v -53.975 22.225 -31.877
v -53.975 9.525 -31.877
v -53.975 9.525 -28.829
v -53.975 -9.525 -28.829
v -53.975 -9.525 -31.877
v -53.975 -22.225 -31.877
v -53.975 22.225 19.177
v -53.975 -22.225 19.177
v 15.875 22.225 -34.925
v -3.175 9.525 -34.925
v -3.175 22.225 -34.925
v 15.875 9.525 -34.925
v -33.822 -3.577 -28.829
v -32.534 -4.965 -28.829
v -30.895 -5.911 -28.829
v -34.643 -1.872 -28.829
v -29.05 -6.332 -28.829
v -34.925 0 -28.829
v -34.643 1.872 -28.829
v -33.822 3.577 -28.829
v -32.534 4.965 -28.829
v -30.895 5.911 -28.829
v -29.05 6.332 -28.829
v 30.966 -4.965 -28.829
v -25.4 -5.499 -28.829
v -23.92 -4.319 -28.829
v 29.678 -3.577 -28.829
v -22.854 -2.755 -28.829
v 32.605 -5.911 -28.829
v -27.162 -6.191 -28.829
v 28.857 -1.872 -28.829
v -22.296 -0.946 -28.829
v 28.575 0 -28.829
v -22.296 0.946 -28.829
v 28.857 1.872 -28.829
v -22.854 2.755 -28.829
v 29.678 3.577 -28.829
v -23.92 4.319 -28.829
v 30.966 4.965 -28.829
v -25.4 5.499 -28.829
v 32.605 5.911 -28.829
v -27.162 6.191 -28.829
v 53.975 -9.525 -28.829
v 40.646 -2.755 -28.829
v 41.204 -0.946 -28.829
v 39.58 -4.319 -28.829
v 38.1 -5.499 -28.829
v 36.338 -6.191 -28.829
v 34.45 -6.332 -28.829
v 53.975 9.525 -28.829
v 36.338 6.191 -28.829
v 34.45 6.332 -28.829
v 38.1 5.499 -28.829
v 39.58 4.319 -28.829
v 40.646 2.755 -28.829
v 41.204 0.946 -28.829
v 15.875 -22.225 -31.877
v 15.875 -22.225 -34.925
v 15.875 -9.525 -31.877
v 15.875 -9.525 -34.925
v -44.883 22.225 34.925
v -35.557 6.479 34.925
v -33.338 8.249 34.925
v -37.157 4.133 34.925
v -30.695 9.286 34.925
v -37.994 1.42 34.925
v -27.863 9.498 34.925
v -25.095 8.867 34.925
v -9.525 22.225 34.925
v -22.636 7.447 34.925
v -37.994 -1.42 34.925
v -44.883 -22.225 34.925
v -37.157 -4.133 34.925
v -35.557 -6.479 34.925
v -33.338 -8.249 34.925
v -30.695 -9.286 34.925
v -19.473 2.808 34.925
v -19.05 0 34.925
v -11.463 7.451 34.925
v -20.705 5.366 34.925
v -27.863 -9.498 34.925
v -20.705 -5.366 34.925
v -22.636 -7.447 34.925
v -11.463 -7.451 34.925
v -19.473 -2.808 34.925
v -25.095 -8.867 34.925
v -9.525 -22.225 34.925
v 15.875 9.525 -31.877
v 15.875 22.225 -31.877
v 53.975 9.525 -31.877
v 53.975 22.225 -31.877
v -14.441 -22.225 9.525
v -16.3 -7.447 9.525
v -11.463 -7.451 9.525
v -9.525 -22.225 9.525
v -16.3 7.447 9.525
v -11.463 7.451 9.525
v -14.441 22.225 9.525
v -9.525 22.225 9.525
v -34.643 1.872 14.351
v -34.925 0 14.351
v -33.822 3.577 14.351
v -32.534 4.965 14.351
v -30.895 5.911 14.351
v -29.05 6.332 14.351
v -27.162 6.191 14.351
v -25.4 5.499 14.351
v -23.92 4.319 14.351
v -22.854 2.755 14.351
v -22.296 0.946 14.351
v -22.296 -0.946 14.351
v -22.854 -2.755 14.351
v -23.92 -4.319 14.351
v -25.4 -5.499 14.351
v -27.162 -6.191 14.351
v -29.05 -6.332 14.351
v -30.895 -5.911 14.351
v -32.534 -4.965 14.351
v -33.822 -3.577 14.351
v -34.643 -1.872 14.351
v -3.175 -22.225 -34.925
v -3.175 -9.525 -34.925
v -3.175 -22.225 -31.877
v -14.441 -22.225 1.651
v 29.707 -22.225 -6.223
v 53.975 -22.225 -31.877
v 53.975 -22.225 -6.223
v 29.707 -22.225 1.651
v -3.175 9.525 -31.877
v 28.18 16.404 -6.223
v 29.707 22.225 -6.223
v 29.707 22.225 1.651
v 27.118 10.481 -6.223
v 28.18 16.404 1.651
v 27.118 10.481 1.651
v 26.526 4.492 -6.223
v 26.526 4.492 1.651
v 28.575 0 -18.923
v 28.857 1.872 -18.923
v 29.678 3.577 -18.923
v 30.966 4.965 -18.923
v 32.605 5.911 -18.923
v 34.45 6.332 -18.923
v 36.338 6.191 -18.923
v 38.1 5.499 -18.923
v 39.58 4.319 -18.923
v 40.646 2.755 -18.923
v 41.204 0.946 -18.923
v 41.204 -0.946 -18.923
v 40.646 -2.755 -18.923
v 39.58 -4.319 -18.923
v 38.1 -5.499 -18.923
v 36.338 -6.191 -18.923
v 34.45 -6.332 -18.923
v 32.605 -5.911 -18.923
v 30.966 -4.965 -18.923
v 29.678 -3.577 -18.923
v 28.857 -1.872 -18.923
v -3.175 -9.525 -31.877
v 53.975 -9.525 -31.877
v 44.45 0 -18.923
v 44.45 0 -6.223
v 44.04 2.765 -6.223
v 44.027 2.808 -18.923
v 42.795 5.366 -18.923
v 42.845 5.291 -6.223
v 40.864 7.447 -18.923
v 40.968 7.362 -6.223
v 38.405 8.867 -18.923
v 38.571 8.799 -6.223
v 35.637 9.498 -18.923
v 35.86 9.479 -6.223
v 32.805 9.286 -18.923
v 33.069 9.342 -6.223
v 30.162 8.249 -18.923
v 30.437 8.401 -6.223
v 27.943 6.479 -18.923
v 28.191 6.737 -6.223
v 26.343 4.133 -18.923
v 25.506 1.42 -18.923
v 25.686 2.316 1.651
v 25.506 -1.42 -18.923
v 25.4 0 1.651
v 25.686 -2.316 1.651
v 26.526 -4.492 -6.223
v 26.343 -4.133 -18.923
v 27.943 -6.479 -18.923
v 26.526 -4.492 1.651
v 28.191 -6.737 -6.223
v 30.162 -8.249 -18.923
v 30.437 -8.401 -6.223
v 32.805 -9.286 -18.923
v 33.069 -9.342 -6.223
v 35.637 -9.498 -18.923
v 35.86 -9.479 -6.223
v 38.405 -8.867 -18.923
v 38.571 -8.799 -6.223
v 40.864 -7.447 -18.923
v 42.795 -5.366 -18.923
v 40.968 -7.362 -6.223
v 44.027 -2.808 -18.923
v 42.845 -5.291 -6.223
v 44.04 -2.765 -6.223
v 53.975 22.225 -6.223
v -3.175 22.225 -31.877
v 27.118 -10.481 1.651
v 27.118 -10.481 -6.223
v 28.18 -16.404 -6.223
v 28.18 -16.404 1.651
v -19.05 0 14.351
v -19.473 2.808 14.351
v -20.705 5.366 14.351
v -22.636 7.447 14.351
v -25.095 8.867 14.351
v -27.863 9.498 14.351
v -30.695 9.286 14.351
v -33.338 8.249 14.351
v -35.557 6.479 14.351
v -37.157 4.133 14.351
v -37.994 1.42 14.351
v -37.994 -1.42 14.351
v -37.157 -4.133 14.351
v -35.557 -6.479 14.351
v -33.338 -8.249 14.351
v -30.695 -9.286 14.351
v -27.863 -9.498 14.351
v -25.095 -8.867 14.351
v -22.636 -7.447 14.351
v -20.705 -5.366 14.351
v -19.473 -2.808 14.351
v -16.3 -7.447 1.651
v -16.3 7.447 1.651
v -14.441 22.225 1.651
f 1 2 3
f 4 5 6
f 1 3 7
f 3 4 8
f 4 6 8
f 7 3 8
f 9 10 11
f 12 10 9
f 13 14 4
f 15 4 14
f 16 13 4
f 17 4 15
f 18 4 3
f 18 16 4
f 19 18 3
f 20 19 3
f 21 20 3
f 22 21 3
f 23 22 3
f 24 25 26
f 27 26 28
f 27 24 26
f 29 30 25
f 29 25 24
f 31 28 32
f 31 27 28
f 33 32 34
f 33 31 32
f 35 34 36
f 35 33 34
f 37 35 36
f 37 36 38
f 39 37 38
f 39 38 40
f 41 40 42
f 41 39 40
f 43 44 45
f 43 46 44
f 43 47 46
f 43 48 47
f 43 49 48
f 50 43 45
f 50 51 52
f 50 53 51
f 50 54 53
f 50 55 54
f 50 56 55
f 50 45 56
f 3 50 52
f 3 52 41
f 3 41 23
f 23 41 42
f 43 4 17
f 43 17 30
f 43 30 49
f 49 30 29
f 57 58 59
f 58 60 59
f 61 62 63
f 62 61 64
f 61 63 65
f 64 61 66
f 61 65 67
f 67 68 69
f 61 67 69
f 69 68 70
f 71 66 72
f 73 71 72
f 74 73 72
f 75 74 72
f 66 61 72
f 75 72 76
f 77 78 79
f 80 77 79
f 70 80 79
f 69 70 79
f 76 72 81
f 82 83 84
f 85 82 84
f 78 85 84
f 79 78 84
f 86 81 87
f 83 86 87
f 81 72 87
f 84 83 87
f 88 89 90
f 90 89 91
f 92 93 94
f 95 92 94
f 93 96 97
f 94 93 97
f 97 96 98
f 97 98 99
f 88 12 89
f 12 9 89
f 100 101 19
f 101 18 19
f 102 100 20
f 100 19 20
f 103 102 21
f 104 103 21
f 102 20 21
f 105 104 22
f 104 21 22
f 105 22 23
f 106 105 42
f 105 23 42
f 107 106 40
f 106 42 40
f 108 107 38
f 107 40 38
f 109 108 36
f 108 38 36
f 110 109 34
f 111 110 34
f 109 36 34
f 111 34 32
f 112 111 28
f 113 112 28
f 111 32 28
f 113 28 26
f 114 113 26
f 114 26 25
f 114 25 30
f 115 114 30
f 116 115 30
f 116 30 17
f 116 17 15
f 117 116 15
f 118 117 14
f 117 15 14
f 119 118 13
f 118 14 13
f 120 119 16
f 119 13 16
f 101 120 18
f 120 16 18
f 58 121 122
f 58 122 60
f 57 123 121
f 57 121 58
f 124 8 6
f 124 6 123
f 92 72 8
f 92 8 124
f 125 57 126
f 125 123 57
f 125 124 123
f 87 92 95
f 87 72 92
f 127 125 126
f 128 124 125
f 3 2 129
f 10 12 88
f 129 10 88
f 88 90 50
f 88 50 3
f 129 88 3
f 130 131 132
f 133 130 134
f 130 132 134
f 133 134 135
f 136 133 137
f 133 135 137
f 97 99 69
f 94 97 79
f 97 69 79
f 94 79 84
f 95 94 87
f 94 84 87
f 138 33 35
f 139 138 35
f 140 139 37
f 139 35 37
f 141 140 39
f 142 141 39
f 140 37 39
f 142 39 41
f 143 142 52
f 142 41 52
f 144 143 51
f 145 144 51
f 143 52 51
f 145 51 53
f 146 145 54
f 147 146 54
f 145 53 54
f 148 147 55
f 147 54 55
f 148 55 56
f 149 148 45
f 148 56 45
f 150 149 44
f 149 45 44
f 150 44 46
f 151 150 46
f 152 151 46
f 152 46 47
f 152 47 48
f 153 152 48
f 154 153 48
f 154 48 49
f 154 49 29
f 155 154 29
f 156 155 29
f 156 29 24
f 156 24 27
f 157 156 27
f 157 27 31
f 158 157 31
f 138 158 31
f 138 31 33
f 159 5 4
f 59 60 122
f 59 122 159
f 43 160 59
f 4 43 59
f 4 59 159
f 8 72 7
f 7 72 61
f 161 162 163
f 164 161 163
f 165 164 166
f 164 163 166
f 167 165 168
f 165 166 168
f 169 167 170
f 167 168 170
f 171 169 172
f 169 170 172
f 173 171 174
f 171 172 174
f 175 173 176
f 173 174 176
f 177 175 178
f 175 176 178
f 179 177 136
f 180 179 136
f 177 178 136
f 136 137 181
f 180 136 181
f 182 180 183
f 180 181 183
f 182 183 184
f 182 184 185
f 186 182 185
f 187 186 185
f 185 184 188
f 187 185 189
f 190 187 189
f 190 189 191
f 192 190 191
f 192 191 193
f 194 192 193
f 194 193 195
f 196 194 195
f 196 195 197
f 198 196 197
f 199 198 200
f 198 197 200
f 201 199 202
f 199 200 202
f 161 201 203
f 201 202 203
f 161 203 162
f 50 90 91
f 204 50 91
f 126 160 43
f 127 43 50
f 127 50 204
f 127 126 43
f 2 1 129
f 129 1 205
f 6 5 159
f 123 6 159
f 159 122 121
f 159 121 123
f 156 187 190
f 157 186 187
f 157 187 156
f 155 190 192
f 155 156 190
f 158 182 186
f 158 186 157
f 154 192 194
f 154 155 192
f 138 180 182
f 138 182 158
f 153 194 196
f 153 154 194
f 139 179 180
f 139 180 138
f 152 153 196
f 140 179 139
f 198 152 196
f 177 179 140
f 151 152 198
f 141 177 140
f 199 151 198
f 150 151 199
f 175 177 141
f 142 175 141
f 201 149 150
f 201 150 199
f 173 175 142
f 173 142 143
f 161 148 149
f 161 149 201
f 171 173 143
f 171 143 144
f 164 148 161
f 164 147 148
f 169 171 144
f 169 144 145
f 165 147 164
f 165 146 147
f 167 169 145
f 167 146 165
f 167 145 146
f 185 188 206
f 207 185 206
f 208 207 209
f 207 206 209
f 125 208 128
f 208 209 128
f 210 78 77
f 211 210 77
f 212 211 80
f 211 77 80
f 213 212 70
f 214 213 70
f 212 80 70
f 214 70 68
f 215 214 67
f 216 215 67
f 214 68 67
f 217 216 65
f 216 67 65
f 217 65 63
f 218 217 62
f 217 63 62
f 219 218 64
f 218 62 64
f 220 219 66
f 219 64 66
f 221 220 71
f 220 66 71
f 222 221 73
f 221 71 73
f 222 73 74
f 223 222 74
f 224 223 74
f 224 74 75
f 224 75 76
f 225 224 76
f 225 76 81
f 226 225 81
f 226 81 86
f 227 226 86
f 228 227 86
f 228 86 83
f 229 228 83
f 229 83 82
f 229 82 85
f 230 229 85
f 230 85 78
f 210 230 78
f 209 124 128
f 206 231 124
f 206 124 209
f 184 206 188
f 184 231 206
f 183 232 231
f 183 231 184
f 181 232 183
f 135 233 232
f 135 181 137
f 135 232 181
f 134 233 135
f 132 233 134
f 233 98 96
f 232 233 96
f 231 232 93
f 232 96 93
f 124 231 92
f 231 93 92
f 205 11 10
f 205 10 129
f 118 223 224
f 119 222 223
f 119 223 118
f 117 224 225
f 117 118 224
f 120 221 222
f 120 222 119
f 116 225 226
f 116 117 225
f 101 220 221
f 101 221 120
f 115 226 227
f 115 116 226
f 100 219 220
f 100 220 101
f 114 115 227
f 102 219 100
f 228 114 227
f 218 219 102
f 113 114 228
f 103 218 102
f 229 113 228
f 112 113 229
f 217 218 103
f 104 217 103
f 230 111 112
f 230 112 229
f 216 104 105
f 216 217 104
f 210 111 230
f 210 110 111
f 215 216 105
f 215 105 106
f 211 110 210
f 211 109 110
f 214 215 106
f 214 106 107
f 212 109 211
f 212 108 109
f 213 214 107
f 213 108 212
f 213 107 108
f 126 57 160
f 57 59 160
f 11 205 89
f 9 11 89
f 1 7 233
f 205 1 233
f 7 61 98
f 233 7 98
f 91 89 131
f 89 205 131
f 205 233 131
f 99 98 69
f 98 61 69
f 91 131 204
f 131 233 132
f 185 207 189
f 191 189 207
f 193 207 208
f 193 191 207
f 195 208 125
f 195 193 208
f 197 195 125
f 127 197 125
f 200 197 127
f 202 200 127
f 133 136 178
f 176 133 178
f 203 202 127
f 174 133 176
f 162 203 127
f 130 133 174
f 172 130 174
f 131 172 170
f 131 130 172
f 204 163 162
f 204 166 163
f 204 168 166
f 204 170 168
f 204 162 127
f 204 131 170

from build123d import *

# Parameters (mm, degrees)
F0_W            = 107.95
F0_H            = 69.85
F1_DEPTH        = 22.225
F2_W            = 50.8
F2_H            = 3.048
F2_W_2          = 38.1
F3_DEPTH        = 22.226
F3_DEPTH_BACK   = 22.226
F4_W            = 19.05
F4_H            = 6.096
F5_DEPTH        = 53.976
F5_DEPTH_BACK   = 53.976
F7_DEPTH        = 25.4
F8_R            = 119.126
F9_DEPTH        = 7.874
F10_R           = 76.2
F11_DEPTH       = 7.874
F14_D           = 12.7
F14_CBORE_D     = 19.05
F14_CBORE_DEPTH = 20.574
F15_D           = 12.7
F16_R           = 9.525
F17_DEPTH       = 20.574
F18_SIZE2       = 9.0921120392
F18_SIZE        = 15.748


with BuildPart() as f1:
    # F0 (on Front) → F1 (new body, symmetric)
    with BuildSketch(Plane.XZ):
        Rectangle(F0_W, F0_H)
    extrude(amount=F1_DEPTH, both=True)

    # F2 (on Front) → F3 (cut, two sides)
    with BuildSketch(Plane.XZ) as f3_sk:
        with Locations((-28.575, -33.401)):
            Rectangle(F2_W, F2_H)
        with Locations((34.925, -33.401)):
            Rectangle(F2_W_2, F2_H)
    extrude(amount=-F3_DEPTH, mode=Mode.SUBTRACT)
    extrude(f3_sk.sketch, amount=F3_DEPTH_BACK, mode=Mode.SUBTRACT)

    # F4 (on Right) → F5 (cut, two sides)
    with BuildSketch(Plane.YZ) as f5_sk:
        with Locations((0, -31.877)):
            Rectangle(F4_W, F4_H)
    extrude(amount=F5_DEPTH, mode=Mode.SUBTRACT)
    extrude(f5_sk.sketch, amount=-F5_DEPTH_BACK, mode=Mode.SUBTRACT)

    # F6 (on face) → F7 (cut)
    with BuildSketch(Plane.XY.offset(34.925)):
        with BuildLine():
            Line((53.975, 22.225), (-9.525, 22.225))
            ThreePointArc((-9.525, 22.225), (-11.7065832479, 0), (-9.525, -22.225))
            Line((-9.525, -22.225), (53.975, -22.225))
            Line((53.975, -22.225), (53.975, 22.225))
        make_face()
    extrude(amount=-F7_DEPTH, mode=Mode.SUBTRACT)

    # F8 (on face) → F9 (cut)
    with BuildSketch(Plane.XY.offset(9.525)):
        with Locations((102.5934167521, 0)):
            Circle(F8_R)
    extrude(amount=-F9_DEPTH, mode=Mode.SUBTRACT)

    # F10 (on face) → F11 (cut)
    with BuildSketch(Plane.XY.offset(1.651)):
        with Locations((102.5934167521, 0)):
            Circle(F10_R)
    extrude(amount=-F11_DEPTH, mode=Mode.SUBTRACT)

    # F14 (through all)
    with Locations(Plane.XY.offset(34.925)):
        with Locations((-28.575, 0)):
            CounterBoreHole(F14_D / 2, F14_CBORE_D / 2, F14_CBORE_DEPTH)

    # F15 (through all)
    with Locations(Plane.XY.offset(1.651)):
        with Locations((34.925, 0)):
            Hole(F15_D / 2)

    # F16 (on face) → F17 (cut)
    with BuildSketch(Plane.XY.offset(1.651)):
        with Locations((34.925, 0)):
            Circle(F16_R)
    extrude(amount=-F17_DEPTH, mode=Mode.SUBTRACT)

    # F18
    f18_edges = [f1.edges().sort_by_distance(p)[0] for p in [
        (-53.975, 0, 34.925),
    ]]
    f18_side = f1.faces().sort_by_distance((-53.975, 0, 2.159774))[0]
    chamfer(f18_edges, length=F18_SIZE, length2=F18_SIZE2, reference=f18_side)


solid = f1.part
